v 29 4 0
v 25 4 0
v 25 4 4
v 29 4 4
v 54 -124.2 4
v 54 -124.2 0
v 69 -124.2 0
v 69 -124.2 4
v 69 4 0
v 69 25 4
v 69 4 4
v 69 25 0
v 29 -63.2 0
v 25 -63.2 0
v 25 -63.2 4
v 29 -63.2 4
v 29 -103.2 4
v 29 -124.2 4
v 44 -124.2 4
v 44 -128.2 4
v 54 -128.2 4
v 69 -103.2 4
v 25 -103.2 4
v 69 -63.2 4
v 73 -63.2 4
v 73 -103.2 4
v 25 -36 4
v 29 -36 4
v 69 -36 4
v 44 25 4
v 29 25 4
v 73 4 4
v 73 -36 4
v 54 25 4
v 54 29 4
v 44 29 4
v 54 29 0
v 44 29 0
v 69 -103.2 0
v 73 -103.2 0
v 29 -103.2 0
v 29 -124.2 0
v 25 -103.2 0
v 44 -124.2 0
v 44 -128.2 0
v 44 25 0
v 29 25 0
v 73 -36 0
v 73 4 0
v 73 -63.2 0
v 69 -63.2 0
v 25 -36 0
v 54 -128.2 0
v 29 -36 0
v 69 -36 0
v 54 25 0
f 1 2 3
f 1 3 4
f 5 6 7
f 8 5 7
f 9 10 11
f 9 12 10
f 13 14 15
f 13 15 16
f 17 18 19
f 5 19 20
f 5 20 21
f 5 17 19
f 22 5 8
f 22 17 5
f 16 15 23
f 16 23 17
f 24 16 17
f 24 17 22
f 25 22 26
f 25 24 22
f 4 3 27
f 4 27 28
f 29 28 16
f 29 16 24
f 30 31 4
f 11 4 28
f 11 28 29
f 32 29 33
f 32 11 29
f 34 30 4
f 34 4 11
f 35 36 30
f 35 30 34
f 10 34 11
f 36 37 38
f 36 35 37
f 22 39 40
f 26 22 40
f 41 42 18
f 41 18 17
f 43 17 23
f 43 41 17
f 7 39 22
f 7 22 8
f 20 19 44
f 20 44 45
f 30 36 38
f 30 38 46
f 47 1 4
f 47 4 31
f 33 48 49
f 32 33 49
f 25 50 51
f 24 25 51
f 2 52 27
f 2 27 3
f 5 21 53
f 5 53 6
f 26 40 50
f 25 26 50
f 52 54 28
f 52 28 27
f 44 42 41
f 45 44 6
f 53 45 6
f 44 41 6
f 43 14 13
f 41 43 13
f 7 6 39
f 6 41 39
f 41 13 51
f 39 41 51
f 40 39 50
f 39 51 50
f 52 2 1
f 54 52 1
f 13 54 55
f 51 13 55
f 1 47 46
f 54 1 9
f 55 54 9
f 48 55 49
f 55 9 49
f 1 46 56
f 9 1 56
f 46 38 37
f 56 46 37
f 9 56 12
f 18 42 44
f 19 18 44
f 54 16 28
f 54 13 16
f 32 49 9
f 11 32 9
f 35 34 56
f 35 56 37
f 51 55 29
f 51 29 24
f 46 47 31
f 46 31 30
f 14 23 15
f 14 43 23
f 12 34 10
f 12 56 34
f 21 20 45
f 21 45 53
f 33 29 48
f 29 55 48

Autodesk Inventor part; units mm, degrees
ref_plane "YZ Plane" through (0, 0, 0) normal (1, 0, 0) x (0, 1, 0)
ref_plane "XZ Plane" through (0, 0, 0) normal (0, 1, 0) x (-1, 0, 0)
sketch "Sketch2" plane through (0, 0, 0) normal (0, 0, 1) x (1, 0, 0)
  line L0 (29, -124.2) -> (29, -103.2)
  line L1 (29, -103.2) -> (25, -103.2)
  line L2 (25, -103.2) -> (25, -63.2)
  line L3 (25, -63.2) -> (29, -63.2)
  line L4 (29, -63.2) -> (29, -36)
  line L5 (29, -36) -> (25, -36)
  line L6 (25, -36) -> (25, 4)
  line L7 (25, 4) -> (29, 4)
  line L8 (29, 4) -> (29, 25)
  line L9 (29, 29) -> (29, 25)
  line L10 (29, 25) -> (69, 25)
  line L11 (29, -128.2) -> (29, -124.2)
  line L12 (29, -124.2) -> (69, -124.2)
  line L13 (49, -124.2) -> (49, -141.5735)
  line L14 (73, 4) -> (69, 4)
  line L15 (73, -36) -> (73, 4)
  line L16 (69, -36) -> (73, -36)
  line L17 (73, -63.2) -> (69, -63.2)
  line L18 (73, -103.2) -> (73, -63.2)
  line L19 (69, -103.2) -> (73, -103.2)
  line L20 (69, -103.2) -> (69, -124.2)
  line L21 (69, 25) -> (69, 4)
  line L22 (69, -36) -> (69, -63.2)
  point P0 (0, 0)
  dimension "d15" = 4
  dimension "d16" = 40
  dimension "d17" = 4
  dimension "d20" = 40
  dimension "d21" = 40
  dimension "d22" = 149.2
extrude "Extrusion3" add sketch "Sketch2" along normal blind 4
sketch "Sketch3" plane through (0, 0, 4) normal (0, 0, 1) x (1, 0, 0)
  line L0 (29, -103.2) -> (29, -124.2) projected
  line L1 (29, -124.2) -> (69, -124.2) projected
  line L2 (69, -124.2) -> (69, -103.2) projected
  line L3 (69, -103.2) -> (73, -103.2) projected
  line L4 (73, -103.2) -> (73, -63.2) projected
  line L5 (73, -63.2) -> (69, -63.2) projected
  line L6 (69, -63.2) -> (69, -36) projected
  line L7 (69, -36) -> (73, -36) projected
  line L8 (73, -36) -> (73, 4) projected
  line L9 (73, 4) -> (69, 4) projected
  line L10 (69, 4) -> (69, 25) projected
  line L11 (69, 25) -> (29, 25) projected
  line L12 (29, 25) -> (29, 4) projected
  line L13 (29, 4) -> (25, 4) projected
  line L14 (25, 4) -> (25, -36) projected
  line L15 (25, -36) -> (29, -36) projected
  line L16 (29, -36) -> (29, -63.2) projected
  line L17 (29, -63.2) -> (25, -63.2) projected
  line L18 (25, -63.2) -> (25, -103.2) projected
  line L19 (25, -103.2) -> (29, -103.2) projected
  line L20 (54, 29) -> (44, 29)
  line L21 (44, 29) -> (44, 25)
  line L22 (44, 25) -> (54, 25)
  line L23 (54, 25) -> (54, 29)
  point P0 (0, 0)
  point P1 (49, 25)
  dimension "d23" = 10
  dimension "d24" = 4
extrude "Extrusion4" add sketch "Sketch3" against normal blind 4 contours L21 L20 L23 L11
ref_plane "Work Plane1" through (29, -49.6, 0) normal (0, -1, 0) x (1, 0, 0)
mirror "Mirror1" about plane through (29, -49.6, 0) normal (0, -1, 0) of "Extrusion4"
equation "\"d23\" = D"
equation "\"D\" = 10"
properties part number "F2"
